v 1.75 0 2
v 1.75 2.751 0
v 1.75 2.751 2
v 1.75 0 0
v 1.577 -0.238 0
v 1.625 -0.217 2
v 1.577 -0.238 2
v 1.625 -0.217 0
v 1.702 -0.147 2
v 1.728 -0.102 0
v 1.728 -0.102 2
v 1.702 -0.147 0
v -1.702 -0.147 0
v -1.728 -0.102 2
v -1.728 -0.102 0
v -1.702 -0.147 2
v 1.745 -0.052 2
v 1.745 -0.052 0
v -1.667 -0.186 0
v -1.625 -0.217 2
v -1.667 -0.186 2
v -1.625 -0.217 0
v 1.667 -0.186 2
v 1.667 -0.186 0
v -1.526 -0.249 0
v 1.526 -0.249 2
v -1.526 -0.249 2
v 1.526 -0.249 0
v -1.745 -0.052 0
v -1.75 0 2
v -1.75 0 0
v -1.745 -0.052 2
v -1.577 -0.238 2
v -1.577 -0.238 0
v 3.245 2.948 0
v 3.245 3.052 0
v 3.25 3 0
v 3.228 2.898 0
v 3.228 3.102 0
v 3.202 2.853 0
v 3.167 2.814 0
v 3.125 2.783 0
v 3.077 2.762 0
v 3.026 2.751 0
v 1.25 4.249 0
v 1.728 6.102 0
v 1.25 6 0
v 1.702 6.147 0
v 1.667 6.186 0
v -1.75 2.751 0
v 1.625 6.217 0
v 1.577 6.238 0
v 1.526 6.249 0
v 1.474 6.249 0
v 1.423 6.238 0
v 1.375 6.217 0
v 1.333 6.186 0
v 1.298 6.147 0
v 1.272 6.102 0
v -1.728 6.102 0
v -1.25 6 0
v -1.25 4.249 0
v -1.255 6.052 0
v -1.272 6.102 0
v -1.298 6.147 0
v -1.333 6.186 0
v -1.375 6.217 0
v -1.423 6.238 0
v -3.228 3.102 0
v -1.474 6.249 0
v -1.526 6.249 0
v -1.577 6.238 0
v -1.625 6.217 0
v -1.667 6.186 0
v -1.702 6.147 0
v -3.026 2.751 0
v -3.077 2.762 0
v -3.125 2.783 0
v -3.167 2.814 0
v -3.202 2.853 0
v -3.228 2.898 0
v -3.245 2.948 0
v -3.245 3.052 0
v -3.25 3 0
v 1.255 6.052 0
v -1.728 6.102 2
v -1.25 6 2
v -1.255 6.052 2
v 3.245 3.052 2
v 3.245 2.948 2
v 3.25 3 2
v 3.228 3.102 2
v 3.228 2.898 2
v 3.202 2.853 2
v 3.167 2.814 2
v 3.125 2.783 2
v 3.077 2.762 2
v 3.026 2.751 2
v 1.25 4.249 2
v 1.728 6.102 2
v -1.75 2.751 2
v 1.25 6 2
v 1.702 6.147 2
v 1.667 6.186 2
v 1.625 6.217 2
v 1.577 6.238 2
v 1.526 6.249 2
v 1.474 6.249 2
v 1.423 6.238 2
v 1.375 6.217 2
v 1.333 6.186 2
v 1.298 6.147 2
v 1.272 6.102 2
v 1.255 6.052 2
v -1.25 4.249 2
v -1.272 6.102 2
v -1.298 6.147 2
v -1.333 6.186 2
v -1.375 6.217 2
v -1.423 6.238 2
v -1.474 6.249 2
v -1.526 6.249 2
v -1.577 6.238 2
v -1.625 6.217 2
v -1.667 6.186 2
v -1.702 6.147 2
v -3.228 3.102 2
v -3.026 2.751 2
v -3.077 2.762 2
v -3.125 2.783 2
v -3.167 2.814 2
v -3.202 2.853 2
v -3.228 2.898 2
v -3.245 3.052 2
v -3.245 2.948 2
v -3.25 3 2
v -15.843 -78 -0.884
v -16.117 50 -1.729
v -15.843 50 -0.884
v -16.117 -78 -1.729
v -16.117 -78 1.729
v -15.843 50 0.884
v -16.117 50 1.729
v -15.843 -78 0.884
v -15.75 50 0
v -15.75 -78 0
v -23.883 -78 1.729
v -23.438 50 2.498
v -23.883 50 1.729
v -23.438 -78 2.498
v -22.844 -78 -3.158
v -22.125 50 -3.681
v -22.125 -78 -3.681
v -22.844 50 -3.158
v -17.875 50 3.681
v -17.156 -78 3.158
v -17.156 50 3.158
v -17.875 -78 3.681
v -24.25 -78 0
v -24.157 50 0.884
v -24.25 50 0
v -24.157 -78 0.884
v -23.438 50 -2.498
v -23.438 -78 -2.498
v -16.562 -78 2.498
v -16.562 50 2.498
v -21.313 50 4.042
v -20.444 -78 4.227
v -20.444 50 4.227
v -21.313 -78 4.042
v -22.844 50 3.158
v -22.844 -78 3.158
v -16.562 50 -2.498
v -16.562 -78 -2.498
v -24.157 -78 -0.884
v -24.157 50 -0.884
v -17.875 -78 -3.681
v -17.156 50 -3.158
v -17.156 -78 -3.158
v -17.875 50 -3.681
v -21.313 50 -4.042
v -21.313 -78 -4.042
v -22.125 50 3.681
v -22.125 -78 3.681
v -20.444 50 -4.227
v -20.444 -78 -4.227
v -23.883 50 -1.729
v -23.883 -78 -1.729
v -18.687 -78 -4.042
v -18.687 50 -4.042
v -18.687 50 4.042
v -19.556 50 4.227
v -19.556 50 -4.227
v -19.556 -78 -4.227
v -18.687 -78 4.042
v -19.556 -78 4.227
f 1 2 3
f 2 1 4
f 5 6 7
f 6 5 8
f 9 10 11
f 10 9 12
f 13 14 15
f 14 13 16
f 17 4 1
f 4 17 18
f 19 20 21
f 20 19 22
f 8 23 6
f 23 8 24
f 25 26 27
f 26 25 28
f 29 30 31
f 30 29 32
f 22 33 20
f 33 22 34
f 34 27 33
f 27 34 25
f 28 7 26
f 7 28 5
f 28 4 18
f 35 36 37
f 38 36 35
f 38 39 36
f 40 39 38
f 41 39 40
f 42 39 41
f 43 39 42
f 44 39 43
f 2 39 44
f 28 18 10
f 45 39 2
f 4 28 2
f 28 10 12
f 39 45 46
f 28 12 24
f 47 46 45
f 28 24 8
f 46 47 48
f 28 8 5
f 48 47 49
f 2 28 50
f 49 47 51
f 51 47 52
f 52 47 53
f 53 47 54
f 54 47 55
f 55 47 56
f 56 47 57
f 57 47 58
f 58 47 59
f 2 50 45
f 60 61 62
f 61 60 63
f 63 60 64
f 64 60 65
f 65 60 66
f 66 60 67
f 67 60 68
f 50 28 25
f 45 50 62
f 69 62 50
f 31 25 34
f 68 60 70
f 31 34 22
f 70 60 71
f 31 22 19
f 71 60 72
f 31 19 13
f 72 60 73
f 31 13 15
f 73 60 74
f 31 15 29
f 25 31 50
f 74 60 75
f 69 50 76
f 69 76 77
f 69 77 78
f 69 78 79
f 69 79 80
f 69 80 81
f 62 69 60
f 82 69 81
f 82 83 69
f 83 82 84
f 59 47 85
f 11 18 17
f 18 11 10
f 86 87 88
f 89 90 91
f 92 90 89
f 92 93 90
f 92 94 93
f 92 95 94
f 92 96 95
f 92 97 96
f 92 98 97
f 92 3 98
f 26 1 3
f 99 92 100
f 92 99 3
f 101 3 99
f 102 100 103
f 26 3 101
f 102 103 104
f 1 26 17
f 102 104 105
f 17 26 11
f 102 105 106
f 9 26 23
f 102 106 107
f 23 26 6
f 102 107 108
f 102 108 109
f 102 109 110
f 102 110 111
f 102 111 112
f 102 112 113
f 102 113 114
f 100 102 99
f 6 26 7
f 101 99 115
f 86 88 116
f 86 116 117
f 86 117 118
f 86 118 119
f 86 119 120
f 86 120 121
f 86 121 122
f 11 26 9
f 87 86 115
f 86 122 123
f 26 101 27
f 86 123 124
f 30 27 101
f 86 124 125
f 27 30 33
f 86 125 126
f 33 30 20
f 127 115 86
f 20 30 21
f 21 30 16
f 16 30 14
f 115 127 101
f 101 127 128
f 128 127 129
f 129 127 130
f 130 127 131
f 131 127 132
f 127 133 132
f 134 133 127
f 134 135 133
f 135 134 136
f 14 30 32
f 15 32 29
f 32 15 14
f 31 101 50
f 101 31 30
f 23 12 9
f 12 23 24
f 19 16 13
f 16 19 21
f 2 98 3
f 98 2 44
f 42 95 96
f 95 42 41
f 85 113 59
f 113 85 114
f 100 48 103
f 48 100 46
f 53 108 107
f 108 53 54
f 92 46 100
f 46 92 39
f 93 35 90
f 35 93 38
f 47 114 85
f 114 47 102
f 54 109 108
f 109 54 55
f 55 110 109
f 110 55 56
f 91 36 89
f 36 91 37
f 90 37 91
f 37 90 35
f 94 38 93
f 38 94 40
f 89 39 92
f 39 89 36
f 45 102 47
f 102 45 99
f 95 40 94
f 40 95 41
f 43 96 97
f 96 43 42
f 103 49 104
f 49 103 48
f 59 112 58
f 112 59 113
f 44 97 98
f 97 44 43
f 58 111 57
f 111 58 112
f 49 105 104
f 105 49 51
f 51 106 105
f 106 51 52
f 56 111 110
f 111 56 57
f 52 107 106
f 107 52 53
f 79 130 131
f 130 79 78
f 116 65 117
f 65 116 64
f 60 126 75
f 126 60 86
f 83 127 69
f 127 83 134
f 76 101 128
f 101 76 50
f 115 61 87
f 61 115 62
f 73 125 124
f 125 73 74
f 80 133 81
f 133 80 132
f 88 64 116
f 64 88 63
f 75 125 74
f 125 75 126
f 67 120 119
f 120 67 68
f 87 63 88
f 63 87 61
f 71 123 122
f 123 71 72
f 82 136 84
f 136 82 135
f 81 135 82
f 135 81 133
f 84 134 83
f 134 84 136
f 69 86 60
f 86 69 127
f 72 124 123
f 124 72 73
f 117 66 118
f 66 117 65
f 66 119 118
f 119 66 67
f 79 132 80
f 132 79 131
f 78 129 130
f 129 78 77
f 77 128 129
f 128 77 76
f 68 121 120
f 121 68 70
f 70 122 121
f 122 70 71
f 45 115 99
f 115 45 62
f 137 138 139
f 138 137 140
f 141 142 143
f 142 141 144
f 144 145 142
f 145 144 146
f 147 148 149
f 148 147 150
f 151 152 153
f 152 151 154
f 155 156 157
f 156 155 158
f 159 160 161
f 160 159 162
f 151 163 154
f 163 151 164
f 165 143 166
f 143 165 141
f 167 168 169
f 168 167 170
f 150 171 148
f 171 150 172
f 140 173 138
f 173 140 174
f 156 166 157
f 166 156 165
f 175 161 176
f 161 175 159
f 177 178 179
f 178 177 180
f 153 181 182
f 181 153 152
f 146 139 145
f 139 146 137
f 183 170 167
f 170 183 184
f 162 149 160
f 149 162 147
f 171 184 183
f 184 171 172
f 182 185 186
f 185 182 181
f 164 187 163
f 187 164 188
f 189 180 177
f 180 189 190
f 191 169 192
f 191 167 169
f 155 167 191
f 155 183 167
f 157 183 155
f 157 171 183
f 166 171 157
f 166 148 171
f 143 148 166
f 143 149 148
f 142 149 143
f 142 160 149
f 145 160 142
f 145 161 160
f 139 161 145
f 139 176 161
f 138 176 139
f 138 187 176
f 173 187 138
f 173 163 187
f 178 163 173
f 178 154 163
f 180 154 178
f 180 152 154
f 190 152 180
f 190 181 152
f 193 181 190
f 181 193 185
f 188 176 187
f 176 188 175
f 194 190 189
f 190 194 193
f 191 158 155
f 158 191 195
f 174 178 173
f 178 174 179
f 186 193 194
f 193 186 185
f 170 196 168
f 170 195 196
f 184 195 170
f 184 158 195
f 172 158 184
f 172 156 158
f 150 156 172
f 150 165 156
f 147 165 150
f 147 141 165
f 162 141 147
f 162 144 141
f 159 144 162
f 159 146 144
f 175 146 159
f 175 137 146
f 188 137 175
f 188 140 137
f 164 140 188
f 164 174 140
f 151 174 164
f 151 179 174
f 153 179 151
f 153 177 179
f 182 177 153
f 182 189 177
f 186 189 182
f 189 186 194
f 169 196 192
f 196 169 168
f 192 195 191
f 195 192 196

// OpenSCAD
$fn=30;

pd = .5;
d=2;

rod_r = 1.5;
rod_h = 3;
flange_r = 1.5;
flange_h = 3;
cut_r = 1.5;
cut_d = 2;


vs = [
    [rod_r,0],
    [rod_r, rod_h],
    [rod_r+flange_r, rod_h],
    [cut_r, rod_h+flange_h],
    [cut_r, rod_h+flange_h-cut_d],
    [-(cut_r), rod_h+flange_h-cut_d],
    [-(cut_r), rod_h+flange_h],
    [-(rod_r+flange_r), rod_h],
    [-(rod_r), rod_h],
    [-rod_r, 0],
    [rod_r,0],
];

groups = [
[8,9,0,1],
[1,2,3,4],
[5,6,7,8],
[2,4,5,8]
];

for (group = groups) {
    hull() {
        for (i = group) {
            translate([vs[i][0], vs[i][1], 0]) cylinder(d=pd,h=d);
        }
    }
}

translate([-20,50,0]) rotate([90]) cylinder(d=8.5,h=128); // pencil
